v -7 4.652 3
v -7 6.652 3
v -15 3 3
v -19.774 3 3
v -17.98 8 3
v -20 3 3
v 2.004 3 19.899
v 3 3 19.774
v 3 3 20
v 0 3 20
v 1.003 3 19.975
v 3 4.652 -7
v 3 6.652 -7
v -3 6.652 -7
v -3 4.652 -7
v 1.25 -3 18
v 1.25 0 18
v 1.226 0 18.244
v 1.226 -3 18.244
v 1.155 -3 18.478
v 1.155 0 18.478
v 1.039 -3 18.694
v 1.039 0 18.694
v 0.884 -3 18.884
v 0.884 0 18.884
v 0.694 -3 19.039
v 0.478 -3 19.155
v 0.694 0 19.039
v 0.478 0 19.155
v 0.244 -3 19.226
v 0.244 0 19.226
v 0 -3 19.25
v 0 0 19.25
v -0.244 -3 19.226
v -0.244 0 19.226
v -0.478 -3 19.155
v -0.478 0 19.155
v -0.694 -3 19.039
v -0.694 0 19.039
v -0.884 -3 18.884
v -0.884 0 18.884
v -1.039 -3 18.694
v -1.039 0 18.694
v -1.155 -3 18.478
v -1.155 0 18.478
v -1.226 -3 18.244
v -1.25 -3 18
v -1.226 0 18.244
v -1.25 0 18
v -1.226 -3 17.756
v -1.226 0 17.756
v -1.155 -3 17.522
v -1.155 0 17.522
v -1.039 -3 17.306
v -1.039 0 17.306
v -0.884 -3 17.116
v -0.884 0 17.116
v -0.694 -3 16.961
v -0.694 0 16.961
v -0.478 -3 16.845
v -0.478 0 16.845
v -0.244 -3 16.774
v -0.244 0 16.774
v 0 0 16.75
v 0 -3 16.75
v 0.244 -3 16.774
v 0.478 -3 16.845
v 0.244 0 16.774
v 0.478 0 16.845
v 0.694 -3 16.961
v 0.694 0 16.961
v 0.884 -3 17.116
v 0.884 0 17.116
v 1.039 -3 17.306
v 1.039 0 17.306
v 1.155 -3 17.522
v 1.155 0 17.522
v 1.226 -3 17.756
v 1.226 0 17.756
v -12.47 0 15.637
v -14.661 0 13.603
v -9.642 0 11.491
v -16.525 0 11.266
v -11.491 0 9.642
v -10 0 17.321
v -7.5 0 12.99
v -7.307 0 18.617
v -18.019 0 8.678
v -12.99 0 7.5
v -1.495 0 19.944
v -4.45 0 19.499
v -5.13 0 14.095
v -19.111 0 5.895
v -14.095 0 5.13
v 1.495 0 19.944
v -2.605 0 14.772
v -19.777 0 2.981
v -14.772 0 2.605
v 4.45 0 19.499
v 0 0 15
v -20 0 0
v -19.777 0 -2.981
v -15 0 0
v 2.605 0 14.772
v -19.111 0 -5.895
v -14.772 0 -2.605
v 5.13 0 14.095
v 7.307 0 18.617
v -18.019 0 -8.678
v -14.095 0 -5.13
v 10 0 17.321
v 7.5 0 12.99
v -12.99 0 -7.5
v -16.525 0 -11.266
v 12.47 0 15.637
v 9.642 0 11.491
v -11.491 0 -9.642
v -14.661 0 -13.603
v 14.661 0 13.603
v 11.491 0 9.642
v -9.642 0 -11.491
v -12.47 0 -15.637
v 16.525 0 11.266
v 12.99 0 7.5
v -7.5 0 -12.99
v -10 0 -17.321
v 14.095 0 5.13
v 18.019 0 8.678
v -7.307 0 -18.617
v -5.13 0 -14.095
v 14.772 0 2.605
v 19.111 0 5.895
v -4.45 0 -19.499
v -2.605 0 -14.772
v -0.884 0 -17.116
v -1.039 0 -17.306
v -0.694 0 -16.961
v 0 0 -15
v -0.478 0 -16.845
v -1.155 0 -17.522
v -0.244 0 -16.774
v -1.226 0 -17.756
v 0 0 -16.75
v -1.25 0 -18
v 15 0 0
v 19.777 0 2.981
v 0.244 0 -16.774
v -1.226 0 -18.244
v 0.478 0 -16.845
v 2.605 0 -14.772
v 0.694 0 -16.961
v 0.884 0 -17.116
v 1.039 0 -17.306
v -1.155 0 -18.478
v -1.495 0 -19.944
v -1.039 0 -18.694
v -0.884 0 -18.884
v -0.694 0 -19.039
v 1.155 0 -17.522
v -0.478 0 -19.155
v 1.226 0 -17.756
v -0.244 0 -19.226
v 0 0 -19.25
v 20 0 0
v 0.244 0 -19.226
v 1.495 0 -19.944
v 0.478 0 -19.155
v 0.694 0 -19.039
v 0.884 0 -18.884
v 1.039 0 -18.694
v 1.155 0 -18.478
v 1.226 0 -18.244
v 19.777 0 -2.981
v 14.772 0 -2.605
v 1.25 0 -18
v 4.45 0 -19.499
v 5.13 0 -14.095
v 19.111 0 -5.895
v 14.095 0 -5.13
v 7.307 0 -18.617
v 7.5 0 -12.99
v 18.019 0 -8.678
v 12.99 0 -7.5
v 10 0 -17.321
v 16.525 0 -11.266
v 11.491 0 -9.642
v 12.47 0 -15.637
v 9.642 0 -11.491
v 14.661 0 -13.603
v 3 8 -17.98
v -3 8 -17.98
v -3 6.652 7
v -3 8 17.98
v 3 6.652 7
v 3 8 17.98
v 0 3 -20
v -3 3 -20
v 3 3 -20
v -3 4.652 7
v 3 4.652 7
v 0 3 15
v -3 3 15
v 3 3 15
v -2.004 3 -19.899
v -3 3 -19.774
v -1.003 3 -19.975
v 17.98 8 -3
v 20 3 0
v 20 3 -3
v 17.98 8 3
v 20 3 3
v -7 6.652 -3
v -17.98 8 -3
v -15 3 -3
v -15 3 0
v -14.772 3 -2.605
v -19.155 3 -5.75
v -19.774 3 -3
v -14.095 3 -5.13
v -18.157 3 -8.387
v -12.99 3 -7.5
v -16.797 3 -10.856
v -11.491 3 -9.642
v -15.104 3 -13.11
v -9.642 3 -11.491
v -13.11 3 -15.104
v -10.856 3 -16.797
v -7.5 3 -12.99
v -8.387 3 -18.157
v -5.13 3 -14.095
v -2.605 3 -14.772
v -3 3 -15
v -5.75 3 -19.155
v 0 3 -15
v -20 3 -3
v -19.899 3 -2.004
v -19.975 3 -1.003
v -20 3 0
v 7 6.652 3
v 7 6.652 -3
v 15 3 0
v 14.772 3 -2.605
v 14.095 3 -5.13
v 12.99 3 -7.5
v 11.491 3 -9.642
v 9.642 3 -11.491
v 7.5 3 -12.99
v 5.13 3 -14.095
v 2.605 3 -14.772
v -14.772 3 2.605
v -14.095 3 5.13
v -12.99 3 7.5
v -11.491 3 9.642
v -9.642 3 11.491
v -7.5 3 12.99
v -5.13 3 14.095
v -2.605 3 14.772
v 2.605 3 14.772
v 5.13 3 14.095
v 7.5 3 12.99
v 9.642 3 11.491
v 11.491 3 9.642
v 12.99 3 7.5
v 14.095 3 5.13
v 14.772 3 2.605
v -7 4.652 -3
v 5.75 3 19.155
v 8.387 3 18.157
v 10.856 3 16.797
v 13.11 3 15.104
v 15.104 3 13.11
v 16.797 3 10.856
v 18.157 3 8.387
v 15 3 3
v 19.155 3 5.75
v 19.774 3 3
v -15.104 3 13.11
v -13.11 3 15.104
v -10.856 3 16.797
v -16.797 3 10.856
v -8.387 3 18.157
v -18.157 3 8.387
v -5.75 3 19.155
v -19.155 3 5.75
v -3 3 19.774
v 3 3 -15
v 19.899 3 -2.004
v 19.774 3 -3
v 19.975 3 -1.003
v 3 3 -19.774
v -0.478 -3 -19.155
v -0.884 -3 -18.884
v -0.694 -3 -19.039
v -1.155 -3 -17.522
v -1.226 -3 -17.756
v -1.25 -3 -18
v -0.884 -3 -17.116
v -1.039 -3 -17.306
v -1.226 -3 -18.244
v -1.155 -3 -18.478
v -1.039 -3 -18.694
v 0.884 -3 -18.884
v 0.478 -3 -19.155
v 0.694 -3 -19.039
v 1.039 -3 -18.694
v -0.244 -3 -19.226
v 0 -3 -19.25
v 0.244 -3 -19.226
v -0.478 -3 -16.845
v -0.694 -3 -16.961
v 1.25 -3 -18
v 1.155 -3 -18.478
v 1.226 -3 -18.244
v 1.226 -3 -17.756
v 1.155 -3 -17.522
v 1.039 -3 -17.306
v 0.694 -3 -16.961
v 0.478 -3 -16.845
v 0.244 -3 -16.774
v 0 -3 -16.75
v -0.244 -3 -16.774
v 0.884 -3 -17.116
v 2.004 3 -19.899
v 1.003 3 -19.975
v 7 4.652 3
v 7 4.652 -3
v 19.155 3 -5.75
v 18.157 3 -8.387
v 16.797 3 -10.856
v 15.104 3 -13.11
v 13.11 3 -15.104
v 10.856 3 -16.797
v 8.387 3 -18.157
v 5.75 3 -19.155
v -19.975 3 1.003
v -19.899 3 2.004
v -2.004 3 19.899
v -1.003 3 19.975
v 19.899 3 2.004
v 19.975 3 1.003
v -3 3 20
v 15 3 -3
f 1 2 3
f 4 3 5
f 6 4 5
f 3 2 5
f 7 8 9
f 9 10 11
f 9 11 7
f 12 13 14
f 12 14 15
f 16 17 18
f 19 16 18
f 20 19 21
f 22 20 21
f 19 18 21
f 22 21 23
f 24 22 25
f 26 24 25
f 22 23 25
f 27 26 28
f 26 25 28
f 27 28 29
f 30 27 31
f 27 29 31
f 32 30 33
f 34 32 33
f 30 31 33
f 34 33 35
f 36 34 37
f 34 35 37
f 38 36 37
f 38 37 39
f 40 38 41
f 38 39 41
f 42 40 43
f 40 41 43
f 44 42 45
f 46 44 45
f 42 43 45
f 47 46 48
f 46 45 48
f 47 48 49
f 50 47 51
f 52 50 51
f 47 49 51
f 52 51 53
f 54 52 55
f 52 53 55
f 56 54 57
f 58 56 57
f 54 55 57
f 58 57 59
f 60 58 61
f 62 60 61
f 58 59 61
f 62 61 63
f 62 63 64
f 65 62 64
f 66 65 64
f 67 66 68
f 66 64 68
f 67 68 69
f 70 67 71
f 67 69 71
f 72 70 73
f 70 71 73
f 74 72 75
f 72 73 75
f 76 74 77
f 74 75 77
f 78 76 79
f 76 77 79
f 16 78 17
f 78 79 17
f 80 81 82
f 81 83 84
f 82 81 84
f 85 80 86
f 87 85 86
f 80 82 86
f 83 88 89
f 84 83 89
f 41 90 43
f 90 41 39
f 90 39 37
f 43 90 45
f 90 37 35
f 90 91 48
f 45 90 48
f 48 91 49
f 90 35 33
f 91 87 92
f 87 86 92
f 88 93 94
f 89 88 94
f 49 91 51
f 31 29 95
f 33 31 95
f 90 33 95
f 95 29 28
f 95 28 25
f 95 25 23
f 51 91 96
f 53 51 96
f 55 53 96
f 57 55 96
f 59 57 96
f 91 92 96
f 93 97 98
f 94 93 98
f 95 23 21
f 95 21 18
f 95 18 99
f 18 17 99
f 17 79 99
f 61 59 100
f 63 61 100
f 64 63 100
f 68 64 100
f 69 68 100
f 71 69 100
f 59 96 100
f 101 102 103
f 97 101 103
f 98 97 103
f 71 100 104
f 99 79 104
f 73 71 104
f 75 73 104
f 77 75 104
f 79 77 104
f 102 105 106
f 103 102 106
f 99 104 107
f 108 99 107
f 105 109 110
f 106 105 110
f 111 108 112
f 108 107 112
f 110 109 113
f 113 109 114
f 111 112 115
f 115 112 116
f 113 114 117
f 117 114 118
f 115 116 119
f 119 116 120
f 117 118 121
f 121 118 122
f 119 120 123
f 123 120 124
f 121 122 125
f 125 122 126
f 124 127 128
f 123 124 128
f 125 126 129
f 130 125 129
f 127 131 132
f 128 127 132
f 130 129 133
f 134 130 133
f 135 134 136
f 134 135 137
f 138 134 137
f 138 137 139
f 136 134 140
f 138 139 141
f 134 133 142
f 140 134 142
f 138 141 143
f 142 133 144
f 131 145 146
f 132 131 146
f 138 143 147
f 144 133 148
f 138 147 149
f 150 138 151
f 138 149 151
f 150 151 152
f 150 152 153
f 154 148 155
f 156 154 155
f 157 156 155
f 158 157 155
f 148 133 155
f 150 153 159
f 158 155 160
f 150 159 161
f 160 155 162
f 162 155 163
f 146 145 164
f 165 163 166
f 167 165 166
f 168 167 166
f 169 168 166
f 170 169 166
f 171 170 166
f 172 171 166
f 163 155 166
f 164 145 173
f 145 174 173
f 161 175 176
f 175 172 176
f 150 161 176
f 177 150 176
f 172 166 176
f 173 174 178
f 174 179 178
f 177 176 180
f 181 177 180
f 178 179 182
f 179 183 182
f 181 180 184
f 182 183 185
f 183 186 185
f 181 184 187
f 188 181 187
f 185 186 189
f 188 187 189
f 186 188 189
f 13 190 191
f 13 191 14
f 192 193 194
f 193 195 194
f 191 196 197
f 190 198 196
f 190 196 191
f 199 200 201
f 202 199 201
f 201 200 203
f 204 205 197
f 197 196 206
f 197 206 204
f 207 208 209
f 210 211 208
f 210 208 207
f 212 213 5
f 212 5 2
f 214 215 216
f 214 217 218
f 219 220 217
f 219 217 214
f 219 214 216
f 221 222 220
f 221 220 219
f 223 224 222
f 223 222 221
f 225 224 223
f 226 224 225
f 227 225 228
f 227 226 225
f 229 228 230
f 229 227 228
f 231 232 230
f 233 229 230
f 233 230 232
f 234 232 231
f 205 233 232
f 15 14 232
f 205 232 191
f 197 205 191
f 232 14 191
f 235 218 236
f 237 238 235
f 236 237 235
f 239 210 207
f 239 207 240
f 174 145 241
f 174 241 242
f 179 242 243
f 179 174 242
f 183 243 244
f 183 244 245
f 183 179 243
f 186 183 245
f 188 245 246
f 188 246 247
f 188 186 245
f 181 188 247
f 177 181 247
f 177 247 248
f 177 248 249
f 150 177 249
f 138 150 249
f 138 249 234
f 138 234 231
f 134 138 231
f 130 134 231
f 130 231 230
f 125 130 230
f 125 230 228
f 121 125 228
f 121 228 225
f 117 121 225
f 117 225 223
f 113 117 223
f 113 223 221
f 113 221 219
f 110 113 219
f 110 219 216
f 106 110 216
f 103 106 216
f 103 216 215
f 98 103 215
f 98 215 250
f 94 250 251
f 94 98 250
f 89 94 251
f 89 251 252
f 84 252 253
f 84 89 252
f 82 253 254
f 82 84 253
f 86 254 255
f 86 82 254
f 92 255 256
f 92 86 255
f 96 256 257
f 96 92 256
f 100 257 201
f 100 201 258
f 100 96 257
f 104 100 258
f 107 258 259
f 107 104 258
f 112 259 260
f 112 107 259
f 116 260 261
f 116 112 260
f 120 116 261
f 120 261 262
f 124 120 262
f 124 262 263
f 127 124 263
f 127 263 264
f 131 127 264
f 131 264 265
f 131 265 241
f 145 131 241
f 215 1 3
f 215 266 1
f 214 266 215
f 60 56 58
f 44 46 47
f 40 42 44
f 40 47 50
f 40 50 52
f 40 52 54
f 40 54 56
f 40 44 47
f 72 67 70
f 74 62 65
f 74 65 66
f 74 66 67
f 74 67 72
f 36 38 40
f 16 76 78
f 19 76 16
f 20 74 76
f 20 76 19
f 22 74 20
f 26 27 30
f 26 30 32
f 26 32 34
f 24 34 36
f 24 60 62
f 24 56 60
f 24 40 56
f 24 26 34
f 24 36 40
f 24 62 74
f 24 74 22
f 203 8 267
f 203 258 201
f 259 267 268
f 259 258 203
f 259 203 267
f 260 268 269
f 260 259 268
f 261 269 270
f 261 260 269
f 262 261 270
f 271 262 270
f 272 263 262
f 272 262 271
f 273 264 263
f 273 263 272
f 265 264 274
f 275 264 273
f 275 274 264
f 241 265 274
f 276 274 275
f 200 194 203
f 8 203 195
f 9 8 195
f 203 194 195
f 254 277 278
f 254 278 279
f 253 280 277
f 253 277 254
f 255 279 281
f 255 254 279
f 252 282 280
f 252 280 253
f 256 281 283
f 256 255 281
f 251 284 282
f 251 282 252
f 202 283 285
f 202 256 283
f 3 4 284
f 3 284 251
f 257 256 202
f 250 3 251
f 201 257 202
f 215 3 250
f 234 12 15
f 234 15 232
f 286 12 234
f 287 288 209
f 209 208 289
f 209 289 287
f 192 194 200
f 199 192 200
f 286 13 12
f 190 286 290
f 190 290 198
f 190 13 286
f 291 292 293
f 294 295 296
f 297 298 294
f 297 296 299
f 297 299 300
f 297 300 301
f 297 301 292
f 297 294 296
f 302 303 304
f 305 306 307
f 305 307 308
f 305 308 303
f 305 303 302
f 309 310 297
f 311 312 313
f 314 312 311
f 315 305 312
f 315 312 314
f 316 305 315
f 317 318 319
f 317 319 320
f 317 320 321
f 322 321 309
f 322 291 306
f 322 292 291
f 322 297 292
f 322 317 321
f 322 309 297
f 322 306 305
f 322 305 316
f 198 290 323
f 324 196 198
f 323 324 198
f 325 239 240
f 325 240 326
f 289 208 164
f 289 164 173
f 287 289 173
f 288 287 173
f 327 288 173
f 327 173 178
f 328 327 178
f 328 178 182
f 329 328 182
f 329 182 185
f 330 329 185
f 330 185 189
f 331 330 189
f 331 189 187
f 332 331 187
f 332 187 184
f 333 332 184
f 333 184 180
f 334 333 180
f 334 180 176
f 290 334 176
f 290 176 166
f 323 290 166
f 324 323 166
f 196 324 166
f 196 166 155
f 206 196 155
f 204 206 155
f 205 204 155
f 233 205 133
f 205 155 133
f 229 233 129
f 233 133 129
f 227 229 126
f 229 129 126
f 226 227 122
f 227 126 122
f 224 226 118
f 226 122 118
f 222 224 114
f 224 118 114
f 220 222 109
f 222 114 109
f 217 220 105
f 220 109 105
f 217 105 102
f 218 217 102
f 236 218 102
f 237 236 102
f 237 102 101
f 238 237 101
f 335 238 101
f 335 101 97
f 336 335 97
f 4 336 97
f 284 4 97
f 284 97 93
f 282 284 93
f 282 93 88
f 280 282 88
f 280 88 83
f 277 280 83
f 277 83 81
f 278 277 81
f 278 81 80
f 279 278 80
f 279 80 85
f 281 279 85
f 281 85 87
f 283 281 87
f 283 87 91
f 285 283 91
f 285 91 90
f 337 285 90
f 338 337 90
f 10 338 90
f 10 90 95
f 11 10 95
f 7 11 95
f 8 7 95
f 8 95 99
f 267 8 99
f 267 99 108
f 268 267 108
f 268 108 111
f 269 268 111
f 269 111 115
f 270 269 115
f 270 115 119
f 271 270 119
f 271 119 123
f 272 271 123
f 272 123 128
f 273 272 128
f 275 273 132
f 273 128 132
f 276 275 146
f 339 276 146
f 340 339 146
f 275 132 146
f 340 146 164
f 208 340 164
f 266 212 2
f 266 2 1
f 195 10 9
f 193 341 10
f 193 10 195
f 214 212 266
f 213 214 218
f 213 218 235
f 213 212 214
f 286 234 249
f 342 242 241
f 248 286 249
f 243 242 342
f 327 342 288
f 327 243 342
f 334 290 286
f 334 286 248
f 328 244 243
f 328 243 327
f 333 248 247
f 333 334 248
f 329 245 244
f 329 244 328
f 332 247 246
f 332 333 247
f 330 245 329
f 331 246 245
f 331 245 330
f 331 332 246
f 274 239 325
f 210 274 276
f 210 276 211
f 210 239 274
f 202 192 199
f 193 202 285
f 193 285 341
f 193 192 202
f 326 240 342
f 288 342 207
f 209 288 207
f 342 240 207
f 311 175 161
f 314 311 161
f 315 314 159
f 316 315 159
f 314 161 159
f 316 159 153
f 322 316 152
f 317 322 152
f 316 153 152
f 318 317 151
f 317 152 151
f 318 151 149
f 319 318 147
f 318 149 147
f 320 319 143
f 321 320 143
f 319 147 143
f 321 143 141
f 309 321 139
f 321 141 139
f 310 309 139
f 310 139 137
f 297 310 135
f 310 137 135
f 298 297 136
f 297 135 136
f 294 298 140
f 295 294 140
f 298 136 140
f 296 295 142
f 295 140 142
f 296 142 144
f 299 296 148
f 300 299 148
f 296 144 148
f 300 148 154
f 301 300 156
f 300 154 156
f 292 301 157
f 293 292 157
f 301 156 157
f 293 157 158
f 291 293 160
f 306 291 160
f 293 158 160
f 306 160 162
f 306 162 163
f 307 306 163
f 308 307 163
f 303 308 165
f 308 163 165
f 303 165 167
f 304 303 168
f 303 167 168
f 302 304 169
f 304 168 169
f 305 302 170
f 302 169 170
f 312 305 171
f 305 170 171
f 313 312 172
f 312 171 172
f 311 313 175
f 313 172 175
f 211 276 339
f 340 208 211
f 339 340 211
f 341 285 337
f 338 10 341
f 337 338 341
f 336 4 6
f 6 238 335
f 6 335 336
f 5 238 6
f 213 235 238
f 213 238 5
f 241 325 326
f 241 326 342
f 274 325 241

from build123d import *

# Parameters (mm, degrees)
SKETCH1_R                = 20
SKETCH1_R_2              = 15
BOSS_EXTRUDE1_DEPTH      = 3
BOSS_EXTRUDE2_DEPTH      = 3
BOSS_EXTRUDE2_DEPTH_BACK = 3
BOSS_EXTRUDE3_DEPTH      = 3
BOSS_EXTRUDE3_DEPTH_BACK = 3
SKETCH4_R                = 1.25
BOSS_EXTRUDE4_DEPTH      = 3


with BuildPart() as part:
    # Sketch1 → Boss-Extrude1 (new body)
    with BuildSketch(Plane(origin=(0, 0, 0), x_dir=(1, 0, 0), z_dir=(0, 1, 0))):
        Circle(SKETCH1_R)
        Circle(SKETCH1_R_2, mode=Mode.SUBTRACT)
    extrude(amount=BOSS_EXTRUDE1_DEPTH)

    # Sketch2 → Boss-Extrude2 (add, two sides: drawn at the far end of the back side and taken through both)
    with BuildSketch(Plane(origin=(0, 0, 0), x_dir=(0, 0, -1), z_dir=(1, 0, 0)).offset(-BOSS_EXTRUDE2_DEPTH_BACK)):
        Polygon((20, 3), (17.979868871, 8), (7, 6.651841622), (7, 4.651841622), (15, 3), align=None)
        Polygon((-7, 4.651841622), (-15, 3), (-20, 3), (-17.979868871, 8), (-7, 6.651841622), align=None)
    extrude(amount=BOSS_EXTRUDE2_DEPTH + BOSS_EXTRUDE2_DEPTH_BACK)

    # Sketch3 → Boss-Extrude3 (add, two sides: drawn at the far end of the back side and taken through both)
    with BuildSketch(Plane.XY.offset(-BOSS_EXTRUDE3_DEPTH_BACK)):
        Polygon((20, 3), (17.979868871, 8), (7, 6.651841622), (7, 4.651841622), (15, 3), align=None)
        Polygon((-7, 4.651841622), (-15, 3), (-20, 3), (-17.979868871, 8), (-7, 6.651841622), align=None)
    extrude(amount=BOSS_EXTRUDE3_DEPTH + BOSS_EXTRUDE3_DEPTH_BACK)

    # Sketch4 → Boss-Extrude4 (add)
    with BuildSketch(Plane.XZ):
        with Locations((0, 18)):
            Circle(SKETCH4_R)
        with Locations((0, -18)):
            Circle(SKETCH4_R)
    extrude(amount=BOSS_EXTRUDE4_DEPTH)


solid = part.part
